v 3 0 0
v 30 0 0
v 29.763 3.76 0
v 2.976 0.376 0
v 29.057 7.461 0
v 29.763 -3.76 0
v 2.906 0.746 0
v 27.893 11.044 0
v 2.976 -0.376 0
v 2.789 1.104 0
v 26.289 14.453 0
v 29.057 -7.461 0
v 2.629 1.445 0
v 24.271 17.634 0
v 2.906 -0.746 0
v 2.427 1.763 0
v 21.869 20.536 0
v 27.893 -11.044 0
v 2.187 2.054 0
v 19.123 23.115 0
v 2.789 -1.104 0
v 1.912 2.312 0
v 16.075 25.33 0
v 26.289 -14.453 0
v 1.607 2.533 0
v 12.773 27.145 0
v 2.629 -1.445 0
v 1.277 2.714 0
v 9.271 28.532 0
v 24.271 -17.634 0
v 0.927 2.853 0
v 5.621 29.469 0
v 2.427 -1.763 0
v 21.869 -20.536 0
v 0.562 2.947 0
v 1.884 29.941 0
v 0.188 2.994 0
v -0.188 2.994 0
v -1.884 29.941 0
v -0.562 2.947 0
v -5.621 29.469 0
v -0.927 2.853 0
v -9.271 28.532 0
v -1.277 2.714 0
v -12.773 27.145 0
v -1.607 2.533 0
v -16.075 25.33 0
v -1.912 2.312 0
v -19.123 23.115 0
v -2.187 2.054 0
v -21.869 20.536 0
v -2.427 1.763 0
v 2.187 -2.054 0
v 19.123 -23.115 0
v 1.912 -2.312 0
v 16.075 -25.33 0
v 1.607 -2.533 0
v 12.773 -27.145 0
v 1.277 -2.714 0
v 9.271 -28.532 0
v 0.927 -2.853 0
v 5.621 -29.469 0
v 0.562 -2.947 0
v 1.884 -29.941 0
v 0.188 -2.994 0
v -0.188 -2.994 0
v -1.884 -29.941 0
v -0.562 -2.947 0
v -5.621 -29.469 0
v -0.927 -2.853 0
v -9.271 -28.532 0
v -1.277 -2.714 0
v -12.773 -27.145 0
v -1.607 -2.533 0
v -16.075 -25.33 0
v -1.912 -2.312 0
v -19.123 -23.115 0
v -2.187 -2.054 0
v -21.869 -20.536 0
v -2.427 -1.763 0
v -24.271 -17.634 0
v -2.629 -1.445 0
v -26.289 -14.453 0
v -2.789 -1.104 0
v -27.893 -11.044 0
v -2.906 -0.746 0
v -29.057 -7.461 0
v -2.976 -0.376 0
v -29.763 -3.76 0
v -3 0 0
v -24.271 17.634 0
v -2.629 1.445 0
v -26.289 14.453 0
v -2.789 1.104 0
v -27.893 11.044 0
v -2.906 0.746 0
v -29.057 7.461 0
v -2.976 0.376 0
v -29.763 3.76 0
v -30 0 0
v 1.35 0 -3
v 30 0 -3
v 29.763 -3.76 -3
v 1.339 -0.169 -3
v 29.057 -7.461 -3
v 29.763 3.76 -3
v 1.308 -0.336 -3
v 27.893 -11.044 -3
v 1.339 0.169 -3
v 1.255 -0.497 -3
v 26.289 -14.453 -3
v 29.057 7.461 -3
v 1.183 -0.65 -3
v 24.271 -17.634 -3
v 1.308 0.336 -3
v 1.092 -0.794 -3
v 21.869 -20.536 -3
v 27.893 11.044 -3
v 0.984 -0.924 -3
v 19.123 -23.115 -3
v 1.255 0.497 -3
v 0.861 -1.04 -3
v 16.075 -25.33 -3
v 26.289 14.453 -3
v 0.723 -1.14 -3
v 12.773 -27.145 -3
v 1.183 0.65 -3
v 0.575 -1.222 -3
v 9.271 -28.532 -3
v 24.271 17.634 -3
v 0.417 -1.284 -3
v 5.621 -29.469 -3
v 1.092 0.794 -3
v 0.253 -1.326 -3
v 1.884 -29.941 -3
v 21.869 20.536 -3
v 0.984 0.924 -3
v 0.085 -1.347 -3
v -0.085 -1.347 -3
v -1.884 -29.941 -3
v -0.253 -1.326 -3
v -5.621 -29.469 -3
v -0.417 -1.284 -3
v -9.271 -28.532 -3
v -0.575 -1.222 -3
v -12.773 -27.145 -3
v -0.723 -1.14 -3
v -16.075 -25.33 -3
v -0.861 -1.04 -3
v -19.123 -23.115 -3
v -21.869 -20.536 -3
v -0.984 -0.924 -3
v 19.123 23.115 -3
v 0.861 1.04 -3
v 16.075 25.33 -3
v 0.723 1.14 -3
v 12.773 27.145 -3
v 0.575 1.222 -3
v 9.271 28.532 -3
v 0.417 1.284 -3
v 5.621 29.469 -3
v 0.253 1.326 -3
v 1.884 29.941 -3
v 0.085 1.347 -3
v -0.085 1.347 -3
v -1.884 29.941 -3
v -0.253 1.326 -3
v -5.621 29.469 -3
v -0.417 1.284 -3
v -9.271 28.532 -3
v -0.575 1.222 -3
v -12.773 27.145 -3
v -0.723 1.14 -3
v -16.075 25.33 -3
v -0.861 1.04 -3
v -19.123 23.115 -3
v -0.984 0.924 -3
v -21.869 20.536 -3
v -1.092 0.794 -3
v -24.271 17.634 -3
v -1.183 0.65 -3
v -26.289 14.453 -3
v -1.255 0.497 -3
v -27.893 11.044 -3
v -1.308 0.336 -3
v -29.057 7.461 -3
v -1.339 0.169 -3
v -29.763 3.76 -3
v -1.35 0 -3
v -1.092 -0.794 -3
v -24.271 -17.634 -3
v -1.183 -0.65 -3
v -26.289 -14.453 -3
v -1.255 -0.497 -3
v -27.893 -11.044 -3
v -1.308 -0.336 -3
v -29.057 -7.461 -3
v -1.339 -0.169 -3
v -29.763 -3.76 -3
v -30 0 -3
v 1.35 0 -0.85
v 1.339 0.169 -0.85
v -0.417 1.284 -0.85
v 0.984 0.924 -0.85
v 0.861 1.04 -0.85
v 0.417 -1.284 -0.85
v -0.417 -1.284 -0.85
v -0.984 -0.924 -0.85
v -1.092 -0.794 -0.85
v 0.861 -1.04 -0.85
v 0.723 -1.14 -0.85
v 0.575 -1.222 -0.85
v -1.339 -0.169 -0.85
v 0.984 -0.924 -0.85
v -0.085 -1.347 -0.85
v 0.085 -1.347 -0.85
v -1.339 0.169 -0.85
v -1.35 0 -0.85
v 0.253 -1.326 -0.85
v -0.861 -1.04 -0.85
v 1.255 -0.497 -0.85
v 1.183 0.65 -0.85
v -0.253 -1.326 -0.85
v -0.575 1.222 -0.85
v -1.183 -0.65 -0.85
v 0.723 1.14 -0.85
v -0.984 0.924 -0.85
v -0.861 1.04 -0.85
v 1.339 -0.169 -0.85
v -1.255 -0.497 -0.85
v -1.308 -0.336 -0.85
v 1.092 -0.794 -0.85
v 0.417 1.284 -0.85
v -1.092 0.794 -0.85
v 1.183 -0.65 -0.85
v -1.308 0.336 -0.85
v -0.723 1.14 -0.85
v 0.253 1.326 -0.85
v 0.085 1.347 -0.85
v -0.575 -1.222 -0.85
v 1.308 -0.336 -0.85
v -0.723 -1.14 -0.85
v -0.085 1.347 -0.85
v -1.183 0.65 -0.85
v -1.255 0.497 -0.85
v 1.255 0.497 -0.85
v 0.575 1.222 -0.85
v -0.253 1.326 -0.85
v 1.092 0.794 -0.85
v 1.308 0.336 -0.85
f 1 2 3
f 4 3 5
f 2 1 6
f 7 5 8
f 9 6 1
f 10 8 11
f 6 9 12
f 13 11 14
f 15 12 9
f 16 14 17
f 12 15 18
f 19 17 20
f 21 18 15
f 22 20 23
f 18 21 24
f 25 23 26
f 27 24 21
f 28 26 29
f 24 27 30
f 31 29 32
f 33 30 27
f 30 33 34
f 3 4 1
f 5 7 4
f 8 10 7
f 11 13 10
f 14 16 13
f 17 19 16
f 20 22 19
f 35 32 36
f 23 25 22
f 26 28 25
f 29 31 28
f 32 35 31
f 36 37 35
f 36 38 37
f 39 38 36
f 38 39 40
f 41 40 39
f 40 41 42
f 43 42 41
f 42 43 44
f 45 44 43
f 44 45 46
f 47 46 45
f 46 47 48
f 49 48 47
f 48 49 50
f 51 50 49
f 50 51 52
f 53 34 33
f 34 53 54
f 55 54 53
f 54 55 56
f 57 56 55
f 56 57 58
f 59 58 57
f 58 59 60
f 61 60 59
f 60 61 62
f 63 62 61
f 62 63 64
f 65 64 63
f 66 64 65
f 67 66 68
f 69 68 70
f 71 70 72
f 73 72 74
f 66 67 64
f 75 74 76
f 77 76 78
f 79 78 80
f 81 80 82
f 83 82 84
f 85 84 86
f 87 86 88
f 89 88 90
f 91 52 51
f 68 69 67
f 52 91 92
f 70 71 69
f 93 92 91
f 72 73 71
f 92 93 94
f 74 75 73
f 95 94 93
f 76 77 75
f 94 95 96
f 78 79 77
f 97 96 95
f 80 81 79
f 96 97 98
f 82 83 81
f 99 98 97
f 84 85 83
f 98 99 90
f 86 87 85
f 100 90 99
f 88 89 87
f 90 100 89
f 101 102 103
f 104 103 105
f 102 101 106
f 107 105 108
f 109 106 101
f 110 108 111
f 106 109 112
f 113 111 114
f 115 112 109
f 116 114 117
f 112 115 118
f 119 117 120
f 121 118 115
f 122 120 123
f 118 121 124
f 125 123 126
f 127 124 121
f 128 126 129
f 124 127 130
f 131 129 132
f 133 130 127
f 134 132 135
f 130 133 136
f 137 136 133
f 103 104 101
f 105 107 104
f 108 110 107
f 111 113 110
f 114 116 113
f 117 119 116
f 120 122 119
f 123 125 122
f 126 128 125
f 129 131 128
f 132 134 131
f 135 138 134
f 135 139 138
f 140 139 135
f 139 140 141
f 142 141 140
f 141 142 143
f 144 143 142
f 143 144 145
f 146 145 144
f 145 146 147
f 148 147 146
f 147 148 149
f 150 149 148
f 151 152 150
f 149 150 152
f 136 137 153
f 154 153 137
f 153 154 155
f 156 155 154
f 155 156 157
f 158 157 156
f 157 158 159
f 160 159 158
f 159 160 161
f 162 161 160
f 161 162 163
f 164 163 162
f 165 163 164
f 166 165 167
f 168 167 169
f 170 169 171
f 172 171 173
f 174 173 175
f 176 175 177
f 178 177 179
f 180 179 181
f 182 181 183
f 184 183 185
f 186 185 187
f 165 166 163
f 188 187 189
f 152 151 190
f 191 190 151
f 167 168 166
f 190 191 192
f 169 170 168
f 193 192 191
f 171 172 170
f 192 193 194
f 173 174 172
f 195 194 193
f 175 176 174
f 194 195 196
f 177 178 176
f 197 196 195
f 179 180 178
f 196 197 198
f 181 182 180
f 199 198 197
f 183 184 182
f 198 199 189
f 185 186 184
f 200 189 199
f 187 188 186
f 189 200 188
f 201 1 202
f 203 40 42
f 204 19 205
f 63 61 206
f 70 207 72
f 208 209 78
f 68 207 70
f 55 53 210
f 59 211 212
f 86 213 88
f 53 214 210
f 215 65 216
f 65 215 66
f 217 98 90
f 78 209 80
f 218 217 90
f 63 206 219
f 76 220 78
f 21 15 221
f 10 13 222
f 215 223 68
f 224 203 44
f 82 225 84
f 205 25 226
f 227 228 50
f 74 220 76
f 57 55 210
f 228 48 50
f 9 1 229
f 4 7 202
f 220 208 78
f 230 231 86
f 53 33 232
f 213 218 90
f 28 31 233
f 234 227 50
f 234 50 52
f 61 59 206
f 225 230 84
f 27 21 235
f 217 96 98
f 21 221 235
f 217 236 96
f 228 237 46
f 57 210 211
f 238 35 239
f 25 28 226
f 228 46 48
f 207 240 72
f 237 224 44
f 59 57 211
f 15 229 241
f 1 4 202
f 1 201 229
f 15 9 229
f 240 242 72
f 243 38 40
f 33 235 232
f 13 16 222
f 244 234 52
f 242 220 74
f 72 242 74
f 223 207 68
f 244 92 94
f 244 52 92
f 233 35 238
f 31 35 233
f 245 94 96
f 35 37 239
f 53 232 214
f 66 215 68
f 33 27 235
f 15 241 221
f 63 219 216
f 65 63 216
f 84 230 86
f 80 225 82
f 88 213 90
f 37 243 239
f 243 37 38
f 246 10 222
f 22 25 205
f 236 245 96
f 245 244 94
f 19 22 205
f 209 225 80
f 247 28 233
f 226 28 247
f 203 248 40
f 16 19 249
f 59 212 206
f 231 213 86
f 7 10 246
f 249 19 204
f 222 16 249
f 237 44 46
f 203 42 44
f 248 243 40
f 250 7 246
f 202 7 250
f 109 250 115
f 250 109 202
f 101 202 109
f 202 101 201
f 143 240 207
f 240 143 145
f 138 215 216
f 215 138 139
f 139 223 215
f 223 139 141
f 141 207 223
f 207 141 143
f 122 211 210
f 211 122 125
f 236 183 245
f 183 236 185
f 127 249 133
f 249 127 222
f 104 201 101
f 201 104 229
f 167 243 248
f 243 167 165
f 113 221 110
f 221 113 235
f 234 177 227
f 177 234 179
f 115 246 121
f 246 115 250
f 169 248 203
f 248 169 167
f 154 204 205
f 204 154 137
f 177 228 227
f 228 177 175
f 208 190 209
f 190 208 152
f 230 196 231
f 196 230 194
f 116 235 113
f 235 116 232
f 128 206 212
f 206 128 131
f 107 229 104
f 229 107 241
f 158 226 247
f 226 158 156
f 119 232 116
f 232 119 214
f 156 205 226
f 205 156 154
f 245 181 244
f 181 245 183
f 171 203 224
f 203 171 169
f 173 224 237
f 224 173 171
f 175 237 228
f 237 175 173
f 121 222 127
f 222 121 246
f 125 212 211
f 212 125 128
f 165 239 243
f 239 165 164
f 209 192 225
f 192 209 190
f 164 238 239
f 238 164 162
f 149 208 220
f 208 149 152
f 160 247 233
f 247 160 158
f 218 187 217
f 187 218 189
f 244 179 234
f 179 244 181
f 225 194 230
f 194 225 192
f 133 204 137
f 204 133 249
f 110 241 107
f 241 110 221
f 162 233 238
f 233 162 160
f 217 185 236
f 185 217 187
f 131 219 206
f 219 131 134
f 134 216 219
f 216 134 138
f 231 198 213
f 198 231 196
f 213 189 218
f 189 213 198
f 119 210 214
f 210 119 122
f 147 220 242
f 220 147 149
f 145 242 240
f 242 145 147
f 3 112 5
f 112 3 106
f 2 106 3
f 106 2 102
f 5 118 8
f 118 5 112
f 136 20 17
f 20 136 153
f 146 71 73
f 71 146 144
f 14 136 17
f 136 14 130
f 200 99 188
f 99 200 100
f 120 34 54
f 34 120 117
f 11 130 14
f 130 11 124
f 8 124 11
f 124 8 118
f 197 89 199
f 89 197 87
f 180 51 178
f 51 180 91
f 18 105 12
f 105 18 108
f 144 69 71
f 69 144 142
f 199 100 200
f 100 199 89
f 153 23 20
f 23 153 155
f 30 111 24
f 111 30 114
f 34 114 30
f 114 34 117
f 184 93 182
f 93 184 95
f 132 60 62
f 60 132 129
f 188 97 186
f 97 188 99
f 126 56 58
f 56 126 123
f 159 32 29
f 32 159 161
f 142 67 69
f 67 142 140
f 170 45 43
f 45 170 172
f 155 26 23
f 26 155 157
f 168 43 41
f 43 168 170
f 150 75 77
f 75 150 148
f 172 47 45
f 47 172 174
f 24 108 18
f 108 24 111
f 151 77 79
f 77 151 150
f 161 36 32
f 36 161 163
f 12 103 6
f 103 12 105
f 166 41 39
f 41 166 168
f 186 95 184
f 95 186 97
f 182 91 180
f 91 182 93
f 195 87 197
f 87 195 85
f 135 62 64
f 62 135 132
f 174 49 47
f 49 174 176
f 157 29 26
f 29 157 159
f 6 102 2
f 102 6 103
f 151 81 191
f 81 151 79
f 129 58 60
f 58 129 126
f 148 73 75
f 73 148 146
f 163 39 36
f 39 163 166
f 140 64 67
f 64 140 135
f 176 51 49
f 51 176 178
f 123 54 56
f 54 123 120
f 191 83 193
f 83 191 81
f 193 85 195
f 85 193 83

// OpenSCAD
$fn = 50;


difference() {
	union() {
		translate(v = [0, 0, -3.0000000000]) {
			cylinder(h = 3, r = 30.0000000000);
		}
	}
	union() {
		translate(v = [0, 0, 0]) {
			rotate(a = [0, 0, 0]) {
				difference() {
					union() {
						translate(v = [0, 0, -3.0000000000]) {
							cylinder(h = 3, r = 1.0000000000);
						}
						translate(v = [0, 0, -0.8500000000]) {
							cylinder(h = 0.8500000000, r1 = 1.3500000000, r2 = 3.0000000000);
						}
						translate(v = [0, 0, -3.0000000000]) {
							cylinder(h = 3, r = 1.3500000000);
						}
						translate(v = [0, 0, -3.0000000000]) {
							cylinder(h = 3, r = 1.0000000000);
						}
					}
					union();
				}
			}
		}
	}
}
